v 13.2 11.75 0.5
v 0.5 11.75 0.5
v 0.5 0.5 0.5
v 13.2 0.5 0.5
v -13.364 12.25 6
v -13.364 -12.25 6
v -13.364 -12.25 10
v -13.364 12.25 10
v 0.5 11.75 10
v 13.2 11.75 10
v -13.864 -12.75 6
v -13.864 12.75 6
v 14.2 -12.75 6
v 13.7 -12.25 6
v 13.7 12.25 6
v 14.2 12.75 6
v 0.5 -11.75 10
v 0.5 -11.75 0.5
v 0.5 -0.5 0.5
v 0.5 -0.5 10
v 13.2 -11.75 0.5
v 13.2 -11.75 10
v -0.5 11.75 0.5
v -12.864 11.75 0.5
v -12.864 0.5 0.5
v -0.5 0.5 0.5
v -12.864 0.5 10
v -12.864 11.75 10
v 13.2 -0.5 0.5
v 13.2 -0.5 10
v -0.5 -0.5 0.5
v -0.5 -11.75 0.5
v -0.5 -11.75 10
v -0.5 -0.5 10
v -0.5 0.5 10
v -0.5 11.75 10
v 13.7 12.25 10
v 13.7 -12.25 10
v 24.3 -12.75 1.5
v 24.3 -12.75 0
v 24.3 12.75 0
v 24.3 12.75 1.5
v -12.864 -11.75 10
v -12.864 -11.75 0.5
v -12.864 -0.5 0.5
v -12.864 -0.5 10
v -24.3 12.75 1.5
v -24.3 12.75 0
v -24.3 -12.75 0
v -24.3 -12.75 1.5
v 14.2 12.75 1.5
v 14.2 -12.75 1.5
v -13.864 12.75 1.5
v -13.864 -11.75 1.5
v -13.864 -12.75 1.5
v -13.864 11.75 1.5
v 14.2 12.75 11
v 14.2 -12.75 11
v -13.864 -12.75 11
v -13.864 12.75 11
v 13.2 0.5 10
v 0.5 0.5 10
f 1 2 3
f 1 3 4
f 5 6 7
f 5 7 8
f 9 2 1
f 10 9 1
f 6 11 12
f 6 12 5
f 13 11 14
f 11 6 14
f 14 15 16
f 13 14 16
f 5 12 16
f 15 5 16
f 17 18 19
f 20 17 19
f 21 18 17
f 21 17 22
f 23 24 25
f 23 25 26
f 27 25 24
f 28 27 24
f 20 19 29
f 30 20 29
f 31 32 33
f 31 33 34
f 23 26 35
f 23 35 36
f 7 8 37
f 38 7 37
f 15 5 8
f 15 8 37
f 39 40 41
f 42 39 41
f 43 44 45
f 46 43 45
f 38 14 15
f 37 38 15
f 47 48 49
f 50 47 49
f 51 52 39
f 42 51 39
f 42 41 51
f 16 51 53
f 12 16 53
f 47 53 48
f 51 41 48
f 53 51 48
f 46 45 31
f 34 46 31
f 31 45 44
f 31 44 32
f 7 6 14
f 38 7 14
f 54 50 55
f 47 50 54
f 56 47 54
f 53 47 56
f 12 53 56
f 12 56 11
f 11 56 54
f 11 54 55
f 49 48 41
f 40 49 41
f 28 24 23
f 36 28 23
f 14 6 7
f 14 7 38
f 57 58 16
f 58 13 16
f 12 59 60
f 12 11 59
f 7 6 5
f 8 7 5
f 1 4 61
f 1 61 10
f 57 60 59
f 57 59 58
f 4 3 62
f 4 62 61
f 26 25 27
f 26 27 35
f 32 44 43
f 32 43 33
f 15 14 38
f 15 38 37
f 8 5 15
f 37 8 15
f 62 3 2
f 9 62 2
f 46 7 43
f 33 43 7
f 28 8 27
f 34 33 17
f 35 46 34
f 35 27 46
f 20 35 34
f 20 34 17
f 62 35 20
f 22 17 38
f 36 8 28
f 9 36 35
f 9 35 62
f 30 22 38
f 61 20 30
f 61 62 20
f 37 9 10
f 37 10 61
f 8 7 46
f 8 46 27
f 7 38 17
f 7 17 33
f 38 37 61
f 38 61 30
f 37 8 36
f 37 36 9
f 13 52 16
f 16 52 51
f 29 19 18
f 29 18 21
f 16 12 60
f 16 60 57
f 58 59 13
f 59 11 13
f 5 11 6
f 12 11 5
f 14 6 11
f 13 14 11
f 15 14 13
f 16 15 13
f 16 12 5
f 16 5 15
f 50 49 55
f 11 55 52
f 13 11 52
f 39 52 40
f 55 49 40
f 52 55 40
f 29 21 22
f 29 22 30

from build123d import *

# Parameters (mm, degrees)
F0_W     = 9.1
F0_H     = 23.5
F1_DEPTH = 1.5
F0_W_2   = 9.4355237663
F0_W_3   = 12.3644762337
F0_H_2   = 11.25
F2_DEPTH = 0.5
F0_W_4   = 12.7
F0_W_5   = 27.0644762337
F0_H_3   = 24.5
F3_DEPTH = 6
F4_DEPTH = 10
F5_W     = 28.0644762337
F5_H     = 25.5
F5_W_2   = 27.0644762337
F5_H_2   = 24.5
F6_DEPTH = 4
F7_W     = 28.0644762337
F7_H     = 25.5
F8_DEPTH = 1


# Not quite as in the source:
# - a feature names something its author has since deleted; it is built from what else it names


with BuildPart() as f1:
    # F0 (on Top) → F1 (new body)
    with BuildSketch(Plane.XY):
        with Locations((18.75, 0)):
            Rectangle(F0_W, F0_H)
        Polygon((24.3, -12.75), (24.3, 12.75), (14.2, 12.75), (14.2, 11.75), (23.3, 11.75), (23.3, -11.75), (14.2, -11.75), (14.2, -12.75), align=None)
    extrude(amount=F1_DEPTH)



with BuildPart() as f1b:
    # F0 (on Top) → F1, piece 2 (new body)
    with BuildSketch(Plane.XY):
        Polygon((-13.8644762337, 11.75), (-13.8644762337, 12.75), (-24.3, 12.75), (-24.3, -12.75), (-13.8644762337, -12.75), (-13.8644762337, -11.75), (-23.3, -11.75), (-23.3, 11.75), align=None)
        with Locations((-18.5822381169, 0)):
            Rectangle(F0_W_2, F0_H)
    extrude(amount=F1_DEPTH)


with BuildPart() as f2:
    # F0 (on Top) → F2 (new body)
    with BuildSketch(Plane.XY):
        with Locations((-6.6822381169, 6.125)):
            Rectangle(F0_W_3, F0_H_2)
    extrude(amount=F2_DEPTH)


with BuildPart() as f2b:
    # F0 (on Top) → F2, piece 2 (new body)
    with BuildSketch(Plane.XY):
        with Locations((6.85, 6.125)):
            Rectangle(F0_W_4, F0_H_2)
    extrude(amount=F2_DEPTH)


with BuildPart() as f2c:
    # F0 (on Top) → F2, piece 3 (new body)
    with BuildSketch(Plane.XY):
        with Locations((-6.6822381169, -6.125)):
            Rectangle(F0_W_3, F0_H_2)
    extrude(amount=F2_DEPTH)


with BuildPart() as f2d:
    # F0 (on Top) → F2, piece 4 (new body)
    with BuildSketch(Plane.XY):
        with Locations((6.85, -6.125)):
            Rectangle(F0_W_4, F0_H_2)
    extrude(amount=F2_DEPTH)


with BuildPart() as f1_1:
    add(f1.part)

    add(f1b.part)  # F3 merges F1b
    # F0 (on Top) → F3 (join)
    with BuildSketch(Plane.XY):
        Polygon((14.2, 11.75), (14.2, 12.75), (-13.8644762337, 12.75), (-13.8644762337, 11.75), (-13.8644762337, -11.75), (-13.8644762337, -12.75), (14.2, -12.75), (14.2, -11.75), align=None)
        with Locations((0.1677618831, 0)):
            Rectangle(F0_W_5, F0_H_3, mode=Mode.SUBTRACT)
    extrude(amount=F3_DEPTH)


    add(f2.part)  # F4 merges F2

    add(f2b.part)  # F4 merges F2b

    add(f2c.part)  # F4 merges F2c

    add(f2d.part)  # F4 merges F2d
    # F0 (on Top) → F4 (join)
    with BuildSketch(Plane.XY):
        with Locations((0.1677618831, 0)):
            Rectangle(F0_W_5, F0_H_3)
        with Locations((-6.6822381169, -6.125)):
            Rectangle(F0_W_3, F0_H_2, mode=Mode.SUBTRACT)
        with Locations((6.85, -6.125)):
            Rectangle(F0_W_4, F0_H_2, mode=Mode.SUBTRACT)
        with Locations((-6.6822381169, 6.125)):
            Rectangle(F0_W_3, F0_H_2, mode=Mode.SUBTRACT)
        with Locations((6.85, 6.125)):
            Rectangle(F0_W_4, F0_H_2, mode=Mode.SUBTRACT)
    extrude(amount=F4_DEPTH)


with BuildPart() as f6:
    # F5 (on face) → F6 (new body)
    with BuildSketch(Plane.XY.offset(6)):
        with Locations((0.1677618831, 0)):
            Rectangle(F5_W, F5_H)
        with Locations((0.1677618831, 0)):
            Rectangle(F5_W_2, F5_H_2, mode=Mode.SUBTRACT)
    extrude(amount=F6_DEPTH)

    # F7 (on face) → F8 (join)
    with BuildSketch(Plane.XY.offset(10)):
        with Locations((0.1677618831, 0)):
            Rectangle(F7_W, F7_H)
    extrude(amount=F8_DEPTH)


solid = Compound([f1_1.part, f6.part])
